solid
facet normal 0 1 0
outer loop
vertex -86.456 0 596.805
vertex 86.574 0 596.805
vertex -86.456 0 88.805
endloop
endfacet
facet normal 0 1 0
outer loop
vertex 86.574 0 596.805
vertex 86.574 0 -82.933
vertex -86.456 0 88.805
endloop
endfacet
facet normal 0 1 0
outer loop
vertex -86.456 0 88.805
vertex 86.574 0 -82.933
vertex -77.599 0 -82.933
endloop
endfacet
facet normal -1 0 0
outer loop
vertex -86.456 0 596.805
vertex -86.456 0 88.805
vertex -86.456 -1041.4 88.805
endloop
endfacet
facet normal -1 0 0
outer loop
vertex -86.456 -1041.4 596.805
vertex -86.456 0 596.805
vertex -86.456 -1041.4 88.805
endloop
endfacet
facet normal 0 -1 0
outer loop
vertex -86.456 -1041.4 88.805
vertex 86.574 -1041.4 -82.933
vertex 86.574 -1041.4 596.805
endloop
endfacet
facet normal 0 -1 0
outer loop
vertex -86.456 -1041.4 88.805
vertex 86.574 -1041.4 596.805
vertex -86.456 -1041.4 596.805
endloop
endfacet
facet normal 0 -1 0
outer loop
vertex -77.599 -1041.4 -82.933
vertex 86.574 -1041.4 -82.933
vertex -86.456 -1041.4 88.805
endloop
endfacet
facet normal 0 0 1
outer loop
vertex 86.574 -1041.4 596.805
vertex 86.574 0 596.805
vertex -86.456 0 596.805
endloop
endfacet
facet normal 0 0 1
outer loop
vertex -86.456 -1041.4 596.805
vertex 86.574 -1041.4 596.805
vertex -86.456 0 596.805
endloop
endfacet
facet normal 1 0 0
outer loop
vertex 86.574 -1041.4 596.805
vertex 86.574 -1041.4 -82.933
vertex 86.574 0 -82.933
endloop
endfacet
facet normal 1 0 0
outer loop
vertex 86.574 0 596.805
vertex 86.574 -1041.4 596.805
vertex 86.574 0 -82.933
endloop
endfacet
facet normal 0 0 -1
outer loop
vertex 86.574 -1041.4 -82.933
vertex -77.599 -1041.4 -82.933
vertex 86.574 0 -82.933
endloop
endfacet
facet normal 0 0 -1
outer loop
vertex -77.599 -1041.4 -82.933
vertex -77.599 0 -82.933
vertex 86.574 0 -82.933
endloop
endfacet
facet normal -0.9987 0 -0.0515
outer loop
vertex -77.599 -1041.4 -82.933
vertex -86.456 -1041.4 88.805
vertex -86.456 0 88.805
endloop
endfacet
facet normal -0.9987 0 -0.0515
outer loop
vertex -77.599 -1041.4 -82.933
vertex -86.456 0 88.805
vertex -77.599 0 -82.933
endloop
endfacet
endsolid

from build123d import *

# Parameters (mm, degrees)
F1_DEPTH = 25.4
F2_DEPTH = 508
F3_DEPTH = 508
F4_DEPTH = 508


with BuildPart() as f1:
    # F0 (on Front) → F1 (new body)
    with BuildSketch(Plane.XZ):
        Polygon((86.5744352341, 88.8054594398), (-86.4560827613, 88.8054594398), (-77.5985121727, -82.9327851534), (86.5744352341, -82.9327851534), align=None)
    extrude(amount=F1_DEPTH)

    # F2 (add): a face of the model
    f2_faces = [f1.faces().sort_by_distance(p)[0] for p in [
        (2.2541798586, -25.4, 3.688199535),
    ]]
    extrude(f2_faces, amount=F2_DEPTH)

    # F3 (add): a face of the model
    f3_faces = [f1.faces().sort_by_distance(p)[0] for p in [
        (2.2541798586, -533.4, 3.688199535),
    ]]
    extrude(f3_faces, amount=F3_DEPTH)

    # F4 (add): a face of the model
    f4_faces = [f1.faces().sort_by_distance(p)[0] for p in [
        (0.0591762364, -520.7, 88.8054594398),
    ]]
    extrude(f4_faces, amount=F4_DEPTH)


solid = f1.part
